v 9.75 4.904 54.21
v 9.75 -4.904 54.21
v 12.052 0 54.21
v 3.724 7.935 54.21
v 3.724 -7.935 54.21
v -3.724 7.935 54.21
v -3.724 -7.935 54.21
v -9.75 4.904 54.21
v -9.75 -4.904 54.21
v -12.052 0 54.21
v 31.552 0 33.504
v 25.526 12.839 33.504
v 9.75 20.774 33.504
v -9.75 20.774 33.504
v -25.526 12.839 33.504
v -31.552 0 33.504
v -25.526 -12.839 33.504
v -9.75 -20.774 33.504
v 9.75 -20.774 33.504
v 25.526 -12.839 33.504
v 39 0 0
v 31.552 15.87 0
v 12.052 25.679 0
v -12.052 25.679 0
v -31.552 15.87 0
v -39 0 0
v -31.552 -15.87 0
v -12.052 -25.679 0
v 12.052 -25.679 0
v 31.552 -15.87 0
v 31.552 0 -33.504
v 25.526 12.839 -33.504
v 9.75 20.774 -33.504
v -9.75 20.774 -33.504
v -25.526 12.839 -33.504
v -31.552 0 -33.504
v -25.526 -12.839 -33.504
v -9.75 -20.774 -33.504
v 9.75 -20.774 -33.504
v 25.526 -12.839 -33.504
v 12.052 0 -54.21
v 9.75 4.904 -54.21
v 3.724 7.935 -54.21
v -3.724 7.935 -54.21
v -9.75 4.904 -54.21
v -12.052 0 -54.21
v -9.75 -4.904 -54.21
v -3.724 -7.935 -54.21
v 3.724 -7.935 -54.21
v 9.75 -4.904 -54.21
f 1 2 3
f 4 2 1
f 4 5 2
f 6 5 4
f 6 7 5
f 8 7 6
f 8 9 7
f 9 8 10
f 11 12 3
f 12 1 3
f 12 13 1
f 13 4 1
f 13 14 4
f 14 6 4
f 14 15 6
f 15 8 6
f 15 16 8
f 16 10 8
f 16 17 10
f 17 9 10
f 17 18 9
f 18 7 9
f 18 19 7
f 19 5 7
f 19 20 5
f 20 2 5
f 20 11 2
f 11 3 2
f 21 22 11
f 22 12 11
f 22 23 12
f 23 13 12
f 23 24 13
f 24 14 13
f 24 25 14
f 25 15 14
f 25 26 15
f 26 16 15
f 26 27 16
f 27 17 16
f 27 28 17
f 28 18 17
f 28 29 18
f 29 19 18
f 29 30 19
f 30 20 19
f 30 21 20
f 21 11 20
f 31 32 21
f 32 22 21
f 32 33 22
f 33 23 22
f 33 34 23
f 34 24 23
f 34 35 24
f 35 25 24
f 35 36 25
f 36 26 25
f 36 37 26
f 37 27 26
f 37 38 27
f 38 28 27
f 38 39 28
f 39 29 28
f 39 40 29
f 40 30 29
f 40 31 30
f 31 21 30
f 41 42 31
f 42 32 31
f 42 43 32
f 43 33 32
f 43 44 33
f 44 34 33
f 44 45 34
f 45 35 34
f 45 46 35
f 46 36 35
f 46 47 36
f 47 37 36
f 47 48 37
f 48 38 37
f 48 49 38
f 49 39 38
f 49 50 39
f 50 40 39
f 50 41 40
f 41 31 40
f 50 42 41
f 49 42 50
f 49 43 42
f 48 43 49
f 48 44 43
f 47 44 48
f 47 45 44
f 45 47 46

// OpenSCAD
// Generated by SolidPython 1.0.1 on 2020-07-29 00:46:50


scale(v = [13, 9, 19]) {
	sphere(r = 3);
}
/***********************************************
*********      SolidPython code:      **********
************************************************
 
# import packages: SolidPython
from solid import *
from solid.utils import *
from itertools import chain, combinations, permutations


class Resize:

    def __init__(self, scad_file):
        self.scad_file = scad_file
        #self.scad_file = import_scad(scad_file)
        # cone/cylinder param:
        self.r1 = 0
        self.r2 = 0
        self.h = 0
        # rectangular prism param:
        self.w = 0
        self.l = 0
        # ellipse param:
        self.r = 0

    # import OpenScad code (file name corresponds to shape)


    # classify shape + parameters
    def assign(self, param1, param2, param3):
        if self.scad_file == 'cone.scad':
            self.r1 = param1
            self.r2 = param2
            self.h = param3
        elif self.scad_file == 'cylinder.scad':
            self.r1 = param1
            self.r2 = param2
            self.h = param3
        elif self.scad_file == 'rectangularPrism.scad':
            self.h = param1
            self.l = param2
            self.w = param3
        else:
            self.r = param1
            self.h = param2

    # resize parameters
    def iterate(self):
        x = range(3, 20, 2)
        i = 1
        if self.scad_file == 'cone.scad':
            tempList = list(permutations(x, 2))
            for temp in tempList:
                param1 = temp[0]
                param2 = temp[1]
                filepath = 'produced_scad_files/' + 'cone' + str(param1) + '_' + str(param2) + '_' + '.scad'
                scad_render_to_file(cylinder(h=param1, r1=param2, r2=0), filepath)

        elif self.scad_file == 'cylinder.scad':
            tempList = list(permutations(x, 3))
            for temp in tempList:
                param1 = temp[0]
                param2 = temp[1]
                filepath = 'produced_scad_files/' + 'cylinder' + str(param1) + '_' + str(param2) + '_' + '.scad'
                scad_render_to_file(cylinder(h=param1, r1=param2, r2=param2), filepath)

        elif self.scad_file == 'rectangularPrism.scad':
            tempList = list(permutations(x, 3))
            for temp in tempList:
                param1 = temp[0]
                param2 = temp[1]
                param3 = temp[2]
                filepath = 'produced_scad_files/' + 'rectangularPrism' + str(param1) + '_' + str(param2) + '_' + str(
                    param3) + '.scad'
                scad_render_to_file(cube(size=(param1, param2, param3)), filepath)

        elif self.scad_file == 'ellipse.scad':
            tempList = list(permutations(x, 4))
            for temp in tempList:
                param1 = temp[0]
                param2 = temp[1]
                param3 = temp[2]
                param4 = temp[3]
                filepath = 'produced_scad_files/' + 'ellipse' + str(param1) + '_' + str(param2) + '_' + str(param3) + '_' + str(param4) + '.scad'
                scad_render_to_file(scale([param1, param2, param3])(sphere(r=param4)), filepath)

    def render_to_scadfile(self):
        scad_render_to_file(scad, 'example.scad') 
 
************************************************/
